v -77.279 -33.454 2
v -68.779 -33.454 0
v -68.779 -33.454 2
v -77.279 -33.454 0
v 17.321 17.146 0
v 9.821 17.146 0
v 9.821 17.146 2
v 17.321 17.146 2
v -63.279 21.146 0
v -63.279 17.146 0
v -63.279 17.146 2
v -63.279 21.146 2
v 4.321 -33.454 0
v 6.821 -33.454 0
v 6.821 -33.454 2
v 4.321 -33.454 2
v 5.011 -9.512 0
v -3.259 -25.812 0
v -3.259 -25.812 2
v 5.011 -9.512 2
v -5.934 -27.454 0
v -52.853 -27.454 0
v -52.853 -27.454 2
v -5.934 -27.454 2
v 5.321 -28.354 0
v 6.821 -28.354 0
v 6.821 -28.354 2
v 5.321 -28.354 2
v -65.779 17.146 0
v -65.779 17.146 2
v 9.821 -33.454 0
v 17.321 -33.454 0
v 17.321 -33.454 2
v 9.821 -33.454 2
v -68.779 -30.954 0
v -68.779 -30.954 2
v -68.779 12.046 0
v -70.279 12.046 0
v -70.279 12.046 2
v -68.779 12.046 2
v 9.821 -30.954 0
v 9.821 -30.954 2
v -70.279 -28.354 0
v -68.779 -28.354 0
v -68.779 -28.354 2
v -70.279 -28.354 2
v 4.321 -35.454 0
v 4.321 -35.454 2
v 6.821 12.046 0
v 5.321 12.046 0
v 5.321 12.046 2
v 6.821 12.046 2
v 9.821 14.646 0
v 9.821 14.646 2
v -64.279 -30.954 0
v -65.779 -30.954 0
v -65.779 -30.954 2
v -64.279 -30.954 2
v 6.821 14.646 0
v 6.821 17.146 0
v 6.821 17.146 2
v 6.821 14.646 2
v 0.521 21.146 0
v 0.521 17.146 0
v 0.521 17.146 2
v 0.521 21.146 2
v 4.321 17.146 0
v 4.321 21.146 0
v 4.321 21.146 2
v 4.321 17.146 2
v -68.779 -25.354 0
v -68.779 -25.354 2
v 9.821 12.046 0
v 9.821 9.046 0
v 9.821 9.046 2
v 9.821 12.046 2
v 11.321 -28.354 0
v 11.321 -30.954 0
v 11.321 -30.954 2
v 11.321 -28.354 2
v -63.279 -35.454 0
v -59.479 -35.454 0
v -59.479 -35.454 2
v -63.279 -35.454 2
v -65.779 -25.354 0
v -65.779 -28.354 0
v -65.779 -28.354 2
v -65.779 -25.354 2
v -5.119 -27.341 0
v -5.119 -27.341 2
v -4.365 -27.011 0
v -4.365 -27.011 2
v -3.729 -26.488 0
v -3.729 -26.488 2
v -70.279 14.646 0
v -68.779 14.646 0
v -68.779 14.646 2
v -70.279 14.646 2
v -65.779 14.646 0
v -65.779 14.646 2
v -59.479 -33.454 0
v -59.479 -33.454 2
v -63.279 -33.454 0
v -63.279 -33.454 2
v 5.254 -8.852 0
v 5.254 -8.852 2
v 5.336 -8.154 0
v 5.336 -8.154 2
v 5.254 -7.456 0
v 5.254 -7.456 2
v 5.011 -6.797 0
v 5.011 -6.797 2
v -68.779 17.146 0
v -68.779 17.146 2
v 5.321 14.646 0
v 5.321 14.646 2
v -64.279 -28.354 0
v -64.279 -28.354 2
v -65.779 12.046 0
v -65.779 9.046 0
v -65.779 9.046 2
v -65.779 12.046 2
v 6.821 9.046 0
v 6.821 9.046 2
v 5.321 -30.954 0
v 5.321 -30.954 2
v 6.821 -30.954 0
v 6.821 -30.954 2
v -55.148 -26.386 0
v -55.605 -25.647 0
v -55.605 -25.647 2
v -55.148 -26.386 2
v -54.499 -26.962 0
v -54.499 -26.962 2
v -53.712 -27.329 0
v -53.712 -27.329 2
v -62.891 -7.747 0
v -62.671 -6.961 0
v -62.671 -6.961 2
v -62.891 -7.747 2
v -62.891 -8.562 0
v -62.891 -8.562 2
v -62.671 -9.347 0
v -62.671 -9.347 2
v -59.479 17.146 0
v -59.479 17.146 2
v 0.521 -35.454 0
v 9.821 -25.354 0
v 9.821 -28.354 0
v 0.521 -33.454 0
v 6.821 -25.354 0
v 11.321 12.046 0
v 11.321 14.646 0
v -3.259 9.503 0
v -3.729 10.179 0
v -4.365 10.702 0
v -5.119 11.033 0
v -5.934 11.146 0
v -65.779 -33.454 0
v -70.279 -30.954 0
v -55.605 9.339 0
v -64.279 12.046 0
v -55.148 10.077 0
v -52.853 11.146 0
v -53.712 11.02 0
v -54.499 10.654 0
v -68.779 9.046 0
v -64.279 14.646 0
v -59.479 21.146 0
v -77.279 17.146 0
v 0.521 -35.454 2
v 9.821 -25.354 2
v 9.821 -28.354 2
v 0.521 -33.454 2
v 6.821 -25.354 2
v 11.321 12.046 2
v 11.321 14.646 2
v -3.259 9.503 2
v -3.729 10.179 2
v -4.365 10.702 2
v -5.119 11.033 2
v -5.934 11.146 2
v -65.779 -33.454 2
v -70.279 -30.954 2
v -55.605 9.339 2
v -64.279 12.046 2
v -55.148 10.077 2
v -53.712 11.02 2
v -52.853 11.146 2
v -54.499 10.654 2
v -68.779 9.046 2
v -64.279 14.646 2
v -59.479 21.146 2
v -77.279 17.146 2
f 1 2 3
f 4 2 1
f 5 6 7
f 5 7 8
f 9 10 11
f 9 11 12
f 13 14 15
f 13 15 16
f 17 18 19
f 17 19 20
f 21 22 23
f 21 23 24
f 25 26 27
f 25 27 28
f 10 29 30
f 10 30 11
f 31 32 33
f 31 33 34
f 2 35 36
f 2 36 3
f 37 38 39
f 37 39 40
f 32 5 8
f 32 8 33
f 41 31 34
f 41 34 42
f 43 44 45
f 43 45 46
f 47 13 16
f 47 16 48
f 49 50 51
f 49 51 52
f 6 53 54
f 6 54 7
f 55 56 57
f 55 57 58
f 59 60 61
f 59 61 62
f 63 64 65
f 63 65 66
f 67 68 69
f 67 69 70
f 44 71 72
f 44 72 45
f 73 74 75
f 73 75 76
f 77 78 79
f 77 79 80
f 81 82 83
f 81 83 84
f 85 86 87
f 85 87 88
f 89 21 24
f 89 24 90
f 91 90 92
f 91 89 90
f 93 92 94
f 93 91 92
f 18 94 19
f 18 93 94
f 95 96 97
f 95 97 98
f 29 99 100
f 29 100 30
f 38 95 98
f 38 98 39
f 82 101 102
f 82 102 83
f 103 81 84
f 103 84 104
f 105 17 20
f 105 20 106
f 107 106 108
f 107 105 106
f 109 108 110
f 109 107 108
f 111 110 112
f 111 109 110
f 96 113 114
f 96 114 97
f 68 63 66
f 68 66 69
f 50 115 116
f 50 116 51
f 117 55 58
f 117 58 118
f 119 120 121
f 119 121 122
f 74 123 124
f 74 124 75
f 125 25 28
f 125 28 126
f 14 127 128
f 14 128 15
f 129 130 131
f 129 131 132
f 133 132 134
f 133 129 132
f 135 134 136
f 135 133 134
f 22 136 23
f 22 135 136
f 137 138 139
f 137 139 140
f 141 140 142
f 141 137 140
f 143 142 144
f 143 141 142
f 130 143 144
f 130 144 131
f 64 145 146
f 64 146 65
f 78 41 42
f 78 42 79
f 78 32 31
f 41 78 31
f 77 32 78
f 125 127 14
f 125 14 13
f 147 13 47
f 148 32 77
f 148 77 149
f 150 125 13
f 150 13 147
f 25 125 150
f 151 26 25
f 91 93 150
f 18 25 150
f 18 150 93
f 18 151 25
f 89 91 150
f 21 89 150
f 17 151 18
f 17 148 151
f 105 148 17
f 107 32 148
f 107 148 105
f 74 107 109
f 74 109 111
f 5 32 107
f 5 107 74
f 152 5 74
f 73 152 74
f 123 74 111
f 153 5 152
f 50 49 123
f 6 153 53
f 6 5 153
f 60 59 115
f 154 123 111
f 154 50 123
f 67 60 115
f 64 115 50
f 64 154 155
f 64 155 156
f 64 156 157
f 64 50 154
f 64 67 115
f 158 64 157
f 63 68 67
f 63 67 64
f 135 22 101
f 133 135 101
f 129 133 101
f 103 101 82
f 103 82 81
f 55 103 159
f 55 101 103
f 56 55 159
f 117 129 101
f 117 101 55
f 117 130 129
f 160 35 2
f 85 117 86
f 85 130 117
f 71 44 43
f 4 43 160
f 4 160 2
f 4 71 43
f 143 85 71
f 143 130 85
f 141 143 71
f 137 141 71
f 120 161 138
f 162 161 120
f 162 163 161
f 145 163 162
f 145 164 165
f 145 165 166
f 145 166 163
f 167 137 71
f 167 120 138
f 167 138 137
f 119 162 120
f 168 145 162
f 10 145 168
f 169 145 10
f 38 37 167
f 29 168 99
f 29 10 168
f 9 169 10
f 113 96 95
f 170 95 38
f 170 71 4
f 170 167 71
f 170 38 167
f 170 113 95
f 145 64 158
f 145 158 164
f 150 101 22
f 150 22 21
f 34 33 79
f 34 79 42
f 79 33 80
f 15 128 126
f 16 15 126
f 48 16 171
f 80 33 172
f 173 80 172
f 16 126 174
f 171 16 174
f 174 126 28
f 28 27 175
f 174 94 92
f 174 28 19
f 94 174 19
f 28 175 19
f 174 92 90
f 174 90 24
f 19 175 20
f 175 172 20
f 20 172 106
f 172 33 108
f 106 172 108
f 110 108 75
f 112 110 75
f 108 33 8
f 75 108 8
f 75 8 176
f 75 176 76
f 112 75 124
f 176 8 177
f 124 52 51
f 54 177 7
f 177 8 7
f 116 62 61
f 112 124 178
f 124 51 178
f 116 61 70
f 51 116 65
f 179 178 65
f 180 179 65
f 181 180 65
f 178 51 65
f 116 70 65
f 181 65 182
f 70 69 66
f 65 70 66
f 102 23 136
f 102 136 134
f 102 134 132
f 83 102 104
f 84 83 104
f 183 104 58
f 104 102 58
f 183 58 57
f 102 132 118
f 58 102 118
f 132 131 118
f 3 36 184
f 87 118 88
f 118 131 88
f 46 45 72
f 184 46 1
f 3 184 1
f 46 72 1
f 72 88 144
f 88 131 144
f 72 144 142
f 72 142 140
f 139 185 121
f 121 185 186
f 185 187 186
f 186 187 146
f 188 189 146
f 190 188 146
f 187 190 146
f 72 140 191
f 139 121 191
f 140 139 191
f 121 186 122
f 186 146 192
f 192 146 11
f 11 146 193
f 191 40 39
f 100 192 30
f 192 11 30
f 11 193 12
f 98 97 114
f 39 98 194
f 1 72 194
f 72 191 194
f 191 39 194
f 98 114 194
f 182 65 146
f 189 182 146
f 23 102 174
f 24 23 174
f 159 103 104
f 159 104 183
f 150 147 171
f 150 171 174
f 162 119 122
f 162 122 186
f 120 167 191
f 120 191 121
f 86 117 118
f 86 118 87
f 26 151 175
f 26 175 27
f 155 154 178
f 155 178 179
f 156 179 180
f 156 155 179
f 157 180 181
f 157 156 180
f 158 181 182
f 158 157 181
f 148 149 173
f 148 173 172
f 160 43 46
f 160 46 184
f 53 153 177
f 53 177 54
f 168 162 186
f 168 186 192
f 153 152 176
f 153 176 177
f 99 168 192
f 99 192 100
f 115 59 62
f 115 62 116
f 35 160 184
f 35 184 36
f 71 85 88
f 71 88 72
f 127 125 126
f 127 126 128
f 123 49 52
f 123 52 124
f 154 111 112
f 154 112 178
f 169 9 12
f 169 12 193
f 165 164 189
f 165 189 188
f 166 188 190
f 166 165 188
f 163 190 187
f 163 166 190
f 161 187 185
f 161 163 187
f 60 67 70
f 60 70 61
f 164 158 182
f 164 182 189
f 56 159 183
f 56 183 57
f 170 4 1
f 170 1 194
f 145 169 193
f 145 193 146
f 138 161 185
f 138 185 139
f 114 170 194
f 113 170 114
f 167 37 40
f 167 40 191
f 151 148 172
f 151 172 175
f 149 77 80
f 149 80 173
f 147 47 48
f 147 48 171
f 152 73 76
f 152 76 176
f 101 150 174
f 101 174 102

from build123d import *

# Parameters (mm, degrees)
EXTRUDE_1_DEPTH = 2


with BuildPart() as part:
    # 草图1 → 凸台-拉伸1 (new body)
    with BuildSketch(Plane.XY):
        Polygon((-63.278571429, -35.454285714), (-63.278571429, -33.454285714), (-65.778571429, -33.454285714), (-65.778571429, -30.954285714), (-64.278571429, -30.954285714), (-64.278571429, -28.354285714), (-65.778571429, -28.354285714), (-65.778571429, -25.354285714), (-68.778571429, -25.354285714), (-68.778571429, -28.354285714), (-70.278571429, -28.354285714), (-70.278571429, -30.954285714), (-68.778571429, -30.954285714), (-68.778571429, -33.454285714), (-77.278571429, -33.454285714), (-77.278571429, 17.145714286), (-68.778571429, 17.145714286), (-68.778571429, 14.645714286), (-70.278571429, 14.645714286), (-70.278571429, 12.045714286), (-68.778571429, 12.045714286), (-68.778571429, 9.045714286), (-65.778571429, 9.045714286), (-65.778571429, 12.045714286), (-64.278571429, 12.045714286), (-64.278571429, 14.645714286), (-65.778571429, 14.645714286), (-65.778571429, 17.145714286), (-63.278571429, 17.145714286), (-63.278571429, 21.145714286), (-59.478571429, 21.145714286), (-59.478571429, 17.145714286), (0.521428571, 17.145714286), (0.521428571, 21.145714286), (4.321428571, 21.145714286), (4.321428571, 17.145714286), (6.821428571, 17.145714286), (6.821428571, 14.645714286), (5.321428571, 14.645714286), (5.321428571, 12.045714286), (6.821428571, 12.045714286), (6.821428571, 9.045714286), (9.821428571, 9.045714286), (9.821428571, 12.045714286), (11.321428571, 12.045714286), (11.321428571, 14.645714286), (9.821428571, 14.645714286), (9.821428571, 17.145714286), (17.321428571, 17.145714286), (17.321428571, -33.454285714), (9.821428571, -33.454285714), (9.821428571, -30.954285714), (11.321428571, -30.954285714), (11.321428571, -28.354285714), (9.821428571, -28.354285714), (9.821428571, -25.354285714), (6.821428571, -25.354285714), (6.821428571, -28.354285714), (5.321428571, -28.354285714), (5.321428571, -30.954285714), (6.821428571, -30.954285714), (6.821428571, -33.454285714), (4.321428571, -33.454285714), (4.321428571, -35.454285714), (0.521428571, -35.454285714), (0.521428571, -33.454285714), (-59.478571429, -33.454285714), (-59.478571429, -35.454285714), align=None)
        with BuildLine():
            Line((-5.934446775, 11.145714286), (-52.852891654, 11.145714286))
            ThreePointArc((-52.852891654, 11.145714286), (-54.499158877, 10.653662497), (-55.605393612, 9.338917105))
            Line((-55.605393612, 9.338917105), (-62.671403465, -6.961082895))
            ThreePointArc((-62.671403465, -6.961082895), (-62.918901506, -8.154285714), (-62.671403465, -9.347488534))
            Line((-62.671403465, -9.347488534), (-55.605393612, -25.647488534))
            ThreePointArc((-55.605393612, -25.647488534), (-54.499158877, -26.962233925), (-52.852891654, -27.454285714))
            Line((-52.852891654, -27.454285714), (-5.934446775, -27.454285714))
            ThreePointArc((-5.934446775, -27.454285714), (-4.364780678, -27.010874915), (-3.259119179, -25.811717943))
            Line((-3.259119179, -25.811717943), (5.011324171, -9.511717943))
            ThreePointArc((5.011324171, -9.511717943), (5.335996575, -8.154285714), (5.011324171, -6.796853486))
            Line((5.011324171, -6.796853486), (-3.259119179, 9.503146514))
            ThreePointArc((-3.259119179, 9.503146514), (-4.364780678, 10.702303487), (-5.934446775, 11.145714286))
        make_face(mode=Mode.SUBTRACT)
    extrude(amount=EXTRUDE_1_DEPTH)


solid = part.part
